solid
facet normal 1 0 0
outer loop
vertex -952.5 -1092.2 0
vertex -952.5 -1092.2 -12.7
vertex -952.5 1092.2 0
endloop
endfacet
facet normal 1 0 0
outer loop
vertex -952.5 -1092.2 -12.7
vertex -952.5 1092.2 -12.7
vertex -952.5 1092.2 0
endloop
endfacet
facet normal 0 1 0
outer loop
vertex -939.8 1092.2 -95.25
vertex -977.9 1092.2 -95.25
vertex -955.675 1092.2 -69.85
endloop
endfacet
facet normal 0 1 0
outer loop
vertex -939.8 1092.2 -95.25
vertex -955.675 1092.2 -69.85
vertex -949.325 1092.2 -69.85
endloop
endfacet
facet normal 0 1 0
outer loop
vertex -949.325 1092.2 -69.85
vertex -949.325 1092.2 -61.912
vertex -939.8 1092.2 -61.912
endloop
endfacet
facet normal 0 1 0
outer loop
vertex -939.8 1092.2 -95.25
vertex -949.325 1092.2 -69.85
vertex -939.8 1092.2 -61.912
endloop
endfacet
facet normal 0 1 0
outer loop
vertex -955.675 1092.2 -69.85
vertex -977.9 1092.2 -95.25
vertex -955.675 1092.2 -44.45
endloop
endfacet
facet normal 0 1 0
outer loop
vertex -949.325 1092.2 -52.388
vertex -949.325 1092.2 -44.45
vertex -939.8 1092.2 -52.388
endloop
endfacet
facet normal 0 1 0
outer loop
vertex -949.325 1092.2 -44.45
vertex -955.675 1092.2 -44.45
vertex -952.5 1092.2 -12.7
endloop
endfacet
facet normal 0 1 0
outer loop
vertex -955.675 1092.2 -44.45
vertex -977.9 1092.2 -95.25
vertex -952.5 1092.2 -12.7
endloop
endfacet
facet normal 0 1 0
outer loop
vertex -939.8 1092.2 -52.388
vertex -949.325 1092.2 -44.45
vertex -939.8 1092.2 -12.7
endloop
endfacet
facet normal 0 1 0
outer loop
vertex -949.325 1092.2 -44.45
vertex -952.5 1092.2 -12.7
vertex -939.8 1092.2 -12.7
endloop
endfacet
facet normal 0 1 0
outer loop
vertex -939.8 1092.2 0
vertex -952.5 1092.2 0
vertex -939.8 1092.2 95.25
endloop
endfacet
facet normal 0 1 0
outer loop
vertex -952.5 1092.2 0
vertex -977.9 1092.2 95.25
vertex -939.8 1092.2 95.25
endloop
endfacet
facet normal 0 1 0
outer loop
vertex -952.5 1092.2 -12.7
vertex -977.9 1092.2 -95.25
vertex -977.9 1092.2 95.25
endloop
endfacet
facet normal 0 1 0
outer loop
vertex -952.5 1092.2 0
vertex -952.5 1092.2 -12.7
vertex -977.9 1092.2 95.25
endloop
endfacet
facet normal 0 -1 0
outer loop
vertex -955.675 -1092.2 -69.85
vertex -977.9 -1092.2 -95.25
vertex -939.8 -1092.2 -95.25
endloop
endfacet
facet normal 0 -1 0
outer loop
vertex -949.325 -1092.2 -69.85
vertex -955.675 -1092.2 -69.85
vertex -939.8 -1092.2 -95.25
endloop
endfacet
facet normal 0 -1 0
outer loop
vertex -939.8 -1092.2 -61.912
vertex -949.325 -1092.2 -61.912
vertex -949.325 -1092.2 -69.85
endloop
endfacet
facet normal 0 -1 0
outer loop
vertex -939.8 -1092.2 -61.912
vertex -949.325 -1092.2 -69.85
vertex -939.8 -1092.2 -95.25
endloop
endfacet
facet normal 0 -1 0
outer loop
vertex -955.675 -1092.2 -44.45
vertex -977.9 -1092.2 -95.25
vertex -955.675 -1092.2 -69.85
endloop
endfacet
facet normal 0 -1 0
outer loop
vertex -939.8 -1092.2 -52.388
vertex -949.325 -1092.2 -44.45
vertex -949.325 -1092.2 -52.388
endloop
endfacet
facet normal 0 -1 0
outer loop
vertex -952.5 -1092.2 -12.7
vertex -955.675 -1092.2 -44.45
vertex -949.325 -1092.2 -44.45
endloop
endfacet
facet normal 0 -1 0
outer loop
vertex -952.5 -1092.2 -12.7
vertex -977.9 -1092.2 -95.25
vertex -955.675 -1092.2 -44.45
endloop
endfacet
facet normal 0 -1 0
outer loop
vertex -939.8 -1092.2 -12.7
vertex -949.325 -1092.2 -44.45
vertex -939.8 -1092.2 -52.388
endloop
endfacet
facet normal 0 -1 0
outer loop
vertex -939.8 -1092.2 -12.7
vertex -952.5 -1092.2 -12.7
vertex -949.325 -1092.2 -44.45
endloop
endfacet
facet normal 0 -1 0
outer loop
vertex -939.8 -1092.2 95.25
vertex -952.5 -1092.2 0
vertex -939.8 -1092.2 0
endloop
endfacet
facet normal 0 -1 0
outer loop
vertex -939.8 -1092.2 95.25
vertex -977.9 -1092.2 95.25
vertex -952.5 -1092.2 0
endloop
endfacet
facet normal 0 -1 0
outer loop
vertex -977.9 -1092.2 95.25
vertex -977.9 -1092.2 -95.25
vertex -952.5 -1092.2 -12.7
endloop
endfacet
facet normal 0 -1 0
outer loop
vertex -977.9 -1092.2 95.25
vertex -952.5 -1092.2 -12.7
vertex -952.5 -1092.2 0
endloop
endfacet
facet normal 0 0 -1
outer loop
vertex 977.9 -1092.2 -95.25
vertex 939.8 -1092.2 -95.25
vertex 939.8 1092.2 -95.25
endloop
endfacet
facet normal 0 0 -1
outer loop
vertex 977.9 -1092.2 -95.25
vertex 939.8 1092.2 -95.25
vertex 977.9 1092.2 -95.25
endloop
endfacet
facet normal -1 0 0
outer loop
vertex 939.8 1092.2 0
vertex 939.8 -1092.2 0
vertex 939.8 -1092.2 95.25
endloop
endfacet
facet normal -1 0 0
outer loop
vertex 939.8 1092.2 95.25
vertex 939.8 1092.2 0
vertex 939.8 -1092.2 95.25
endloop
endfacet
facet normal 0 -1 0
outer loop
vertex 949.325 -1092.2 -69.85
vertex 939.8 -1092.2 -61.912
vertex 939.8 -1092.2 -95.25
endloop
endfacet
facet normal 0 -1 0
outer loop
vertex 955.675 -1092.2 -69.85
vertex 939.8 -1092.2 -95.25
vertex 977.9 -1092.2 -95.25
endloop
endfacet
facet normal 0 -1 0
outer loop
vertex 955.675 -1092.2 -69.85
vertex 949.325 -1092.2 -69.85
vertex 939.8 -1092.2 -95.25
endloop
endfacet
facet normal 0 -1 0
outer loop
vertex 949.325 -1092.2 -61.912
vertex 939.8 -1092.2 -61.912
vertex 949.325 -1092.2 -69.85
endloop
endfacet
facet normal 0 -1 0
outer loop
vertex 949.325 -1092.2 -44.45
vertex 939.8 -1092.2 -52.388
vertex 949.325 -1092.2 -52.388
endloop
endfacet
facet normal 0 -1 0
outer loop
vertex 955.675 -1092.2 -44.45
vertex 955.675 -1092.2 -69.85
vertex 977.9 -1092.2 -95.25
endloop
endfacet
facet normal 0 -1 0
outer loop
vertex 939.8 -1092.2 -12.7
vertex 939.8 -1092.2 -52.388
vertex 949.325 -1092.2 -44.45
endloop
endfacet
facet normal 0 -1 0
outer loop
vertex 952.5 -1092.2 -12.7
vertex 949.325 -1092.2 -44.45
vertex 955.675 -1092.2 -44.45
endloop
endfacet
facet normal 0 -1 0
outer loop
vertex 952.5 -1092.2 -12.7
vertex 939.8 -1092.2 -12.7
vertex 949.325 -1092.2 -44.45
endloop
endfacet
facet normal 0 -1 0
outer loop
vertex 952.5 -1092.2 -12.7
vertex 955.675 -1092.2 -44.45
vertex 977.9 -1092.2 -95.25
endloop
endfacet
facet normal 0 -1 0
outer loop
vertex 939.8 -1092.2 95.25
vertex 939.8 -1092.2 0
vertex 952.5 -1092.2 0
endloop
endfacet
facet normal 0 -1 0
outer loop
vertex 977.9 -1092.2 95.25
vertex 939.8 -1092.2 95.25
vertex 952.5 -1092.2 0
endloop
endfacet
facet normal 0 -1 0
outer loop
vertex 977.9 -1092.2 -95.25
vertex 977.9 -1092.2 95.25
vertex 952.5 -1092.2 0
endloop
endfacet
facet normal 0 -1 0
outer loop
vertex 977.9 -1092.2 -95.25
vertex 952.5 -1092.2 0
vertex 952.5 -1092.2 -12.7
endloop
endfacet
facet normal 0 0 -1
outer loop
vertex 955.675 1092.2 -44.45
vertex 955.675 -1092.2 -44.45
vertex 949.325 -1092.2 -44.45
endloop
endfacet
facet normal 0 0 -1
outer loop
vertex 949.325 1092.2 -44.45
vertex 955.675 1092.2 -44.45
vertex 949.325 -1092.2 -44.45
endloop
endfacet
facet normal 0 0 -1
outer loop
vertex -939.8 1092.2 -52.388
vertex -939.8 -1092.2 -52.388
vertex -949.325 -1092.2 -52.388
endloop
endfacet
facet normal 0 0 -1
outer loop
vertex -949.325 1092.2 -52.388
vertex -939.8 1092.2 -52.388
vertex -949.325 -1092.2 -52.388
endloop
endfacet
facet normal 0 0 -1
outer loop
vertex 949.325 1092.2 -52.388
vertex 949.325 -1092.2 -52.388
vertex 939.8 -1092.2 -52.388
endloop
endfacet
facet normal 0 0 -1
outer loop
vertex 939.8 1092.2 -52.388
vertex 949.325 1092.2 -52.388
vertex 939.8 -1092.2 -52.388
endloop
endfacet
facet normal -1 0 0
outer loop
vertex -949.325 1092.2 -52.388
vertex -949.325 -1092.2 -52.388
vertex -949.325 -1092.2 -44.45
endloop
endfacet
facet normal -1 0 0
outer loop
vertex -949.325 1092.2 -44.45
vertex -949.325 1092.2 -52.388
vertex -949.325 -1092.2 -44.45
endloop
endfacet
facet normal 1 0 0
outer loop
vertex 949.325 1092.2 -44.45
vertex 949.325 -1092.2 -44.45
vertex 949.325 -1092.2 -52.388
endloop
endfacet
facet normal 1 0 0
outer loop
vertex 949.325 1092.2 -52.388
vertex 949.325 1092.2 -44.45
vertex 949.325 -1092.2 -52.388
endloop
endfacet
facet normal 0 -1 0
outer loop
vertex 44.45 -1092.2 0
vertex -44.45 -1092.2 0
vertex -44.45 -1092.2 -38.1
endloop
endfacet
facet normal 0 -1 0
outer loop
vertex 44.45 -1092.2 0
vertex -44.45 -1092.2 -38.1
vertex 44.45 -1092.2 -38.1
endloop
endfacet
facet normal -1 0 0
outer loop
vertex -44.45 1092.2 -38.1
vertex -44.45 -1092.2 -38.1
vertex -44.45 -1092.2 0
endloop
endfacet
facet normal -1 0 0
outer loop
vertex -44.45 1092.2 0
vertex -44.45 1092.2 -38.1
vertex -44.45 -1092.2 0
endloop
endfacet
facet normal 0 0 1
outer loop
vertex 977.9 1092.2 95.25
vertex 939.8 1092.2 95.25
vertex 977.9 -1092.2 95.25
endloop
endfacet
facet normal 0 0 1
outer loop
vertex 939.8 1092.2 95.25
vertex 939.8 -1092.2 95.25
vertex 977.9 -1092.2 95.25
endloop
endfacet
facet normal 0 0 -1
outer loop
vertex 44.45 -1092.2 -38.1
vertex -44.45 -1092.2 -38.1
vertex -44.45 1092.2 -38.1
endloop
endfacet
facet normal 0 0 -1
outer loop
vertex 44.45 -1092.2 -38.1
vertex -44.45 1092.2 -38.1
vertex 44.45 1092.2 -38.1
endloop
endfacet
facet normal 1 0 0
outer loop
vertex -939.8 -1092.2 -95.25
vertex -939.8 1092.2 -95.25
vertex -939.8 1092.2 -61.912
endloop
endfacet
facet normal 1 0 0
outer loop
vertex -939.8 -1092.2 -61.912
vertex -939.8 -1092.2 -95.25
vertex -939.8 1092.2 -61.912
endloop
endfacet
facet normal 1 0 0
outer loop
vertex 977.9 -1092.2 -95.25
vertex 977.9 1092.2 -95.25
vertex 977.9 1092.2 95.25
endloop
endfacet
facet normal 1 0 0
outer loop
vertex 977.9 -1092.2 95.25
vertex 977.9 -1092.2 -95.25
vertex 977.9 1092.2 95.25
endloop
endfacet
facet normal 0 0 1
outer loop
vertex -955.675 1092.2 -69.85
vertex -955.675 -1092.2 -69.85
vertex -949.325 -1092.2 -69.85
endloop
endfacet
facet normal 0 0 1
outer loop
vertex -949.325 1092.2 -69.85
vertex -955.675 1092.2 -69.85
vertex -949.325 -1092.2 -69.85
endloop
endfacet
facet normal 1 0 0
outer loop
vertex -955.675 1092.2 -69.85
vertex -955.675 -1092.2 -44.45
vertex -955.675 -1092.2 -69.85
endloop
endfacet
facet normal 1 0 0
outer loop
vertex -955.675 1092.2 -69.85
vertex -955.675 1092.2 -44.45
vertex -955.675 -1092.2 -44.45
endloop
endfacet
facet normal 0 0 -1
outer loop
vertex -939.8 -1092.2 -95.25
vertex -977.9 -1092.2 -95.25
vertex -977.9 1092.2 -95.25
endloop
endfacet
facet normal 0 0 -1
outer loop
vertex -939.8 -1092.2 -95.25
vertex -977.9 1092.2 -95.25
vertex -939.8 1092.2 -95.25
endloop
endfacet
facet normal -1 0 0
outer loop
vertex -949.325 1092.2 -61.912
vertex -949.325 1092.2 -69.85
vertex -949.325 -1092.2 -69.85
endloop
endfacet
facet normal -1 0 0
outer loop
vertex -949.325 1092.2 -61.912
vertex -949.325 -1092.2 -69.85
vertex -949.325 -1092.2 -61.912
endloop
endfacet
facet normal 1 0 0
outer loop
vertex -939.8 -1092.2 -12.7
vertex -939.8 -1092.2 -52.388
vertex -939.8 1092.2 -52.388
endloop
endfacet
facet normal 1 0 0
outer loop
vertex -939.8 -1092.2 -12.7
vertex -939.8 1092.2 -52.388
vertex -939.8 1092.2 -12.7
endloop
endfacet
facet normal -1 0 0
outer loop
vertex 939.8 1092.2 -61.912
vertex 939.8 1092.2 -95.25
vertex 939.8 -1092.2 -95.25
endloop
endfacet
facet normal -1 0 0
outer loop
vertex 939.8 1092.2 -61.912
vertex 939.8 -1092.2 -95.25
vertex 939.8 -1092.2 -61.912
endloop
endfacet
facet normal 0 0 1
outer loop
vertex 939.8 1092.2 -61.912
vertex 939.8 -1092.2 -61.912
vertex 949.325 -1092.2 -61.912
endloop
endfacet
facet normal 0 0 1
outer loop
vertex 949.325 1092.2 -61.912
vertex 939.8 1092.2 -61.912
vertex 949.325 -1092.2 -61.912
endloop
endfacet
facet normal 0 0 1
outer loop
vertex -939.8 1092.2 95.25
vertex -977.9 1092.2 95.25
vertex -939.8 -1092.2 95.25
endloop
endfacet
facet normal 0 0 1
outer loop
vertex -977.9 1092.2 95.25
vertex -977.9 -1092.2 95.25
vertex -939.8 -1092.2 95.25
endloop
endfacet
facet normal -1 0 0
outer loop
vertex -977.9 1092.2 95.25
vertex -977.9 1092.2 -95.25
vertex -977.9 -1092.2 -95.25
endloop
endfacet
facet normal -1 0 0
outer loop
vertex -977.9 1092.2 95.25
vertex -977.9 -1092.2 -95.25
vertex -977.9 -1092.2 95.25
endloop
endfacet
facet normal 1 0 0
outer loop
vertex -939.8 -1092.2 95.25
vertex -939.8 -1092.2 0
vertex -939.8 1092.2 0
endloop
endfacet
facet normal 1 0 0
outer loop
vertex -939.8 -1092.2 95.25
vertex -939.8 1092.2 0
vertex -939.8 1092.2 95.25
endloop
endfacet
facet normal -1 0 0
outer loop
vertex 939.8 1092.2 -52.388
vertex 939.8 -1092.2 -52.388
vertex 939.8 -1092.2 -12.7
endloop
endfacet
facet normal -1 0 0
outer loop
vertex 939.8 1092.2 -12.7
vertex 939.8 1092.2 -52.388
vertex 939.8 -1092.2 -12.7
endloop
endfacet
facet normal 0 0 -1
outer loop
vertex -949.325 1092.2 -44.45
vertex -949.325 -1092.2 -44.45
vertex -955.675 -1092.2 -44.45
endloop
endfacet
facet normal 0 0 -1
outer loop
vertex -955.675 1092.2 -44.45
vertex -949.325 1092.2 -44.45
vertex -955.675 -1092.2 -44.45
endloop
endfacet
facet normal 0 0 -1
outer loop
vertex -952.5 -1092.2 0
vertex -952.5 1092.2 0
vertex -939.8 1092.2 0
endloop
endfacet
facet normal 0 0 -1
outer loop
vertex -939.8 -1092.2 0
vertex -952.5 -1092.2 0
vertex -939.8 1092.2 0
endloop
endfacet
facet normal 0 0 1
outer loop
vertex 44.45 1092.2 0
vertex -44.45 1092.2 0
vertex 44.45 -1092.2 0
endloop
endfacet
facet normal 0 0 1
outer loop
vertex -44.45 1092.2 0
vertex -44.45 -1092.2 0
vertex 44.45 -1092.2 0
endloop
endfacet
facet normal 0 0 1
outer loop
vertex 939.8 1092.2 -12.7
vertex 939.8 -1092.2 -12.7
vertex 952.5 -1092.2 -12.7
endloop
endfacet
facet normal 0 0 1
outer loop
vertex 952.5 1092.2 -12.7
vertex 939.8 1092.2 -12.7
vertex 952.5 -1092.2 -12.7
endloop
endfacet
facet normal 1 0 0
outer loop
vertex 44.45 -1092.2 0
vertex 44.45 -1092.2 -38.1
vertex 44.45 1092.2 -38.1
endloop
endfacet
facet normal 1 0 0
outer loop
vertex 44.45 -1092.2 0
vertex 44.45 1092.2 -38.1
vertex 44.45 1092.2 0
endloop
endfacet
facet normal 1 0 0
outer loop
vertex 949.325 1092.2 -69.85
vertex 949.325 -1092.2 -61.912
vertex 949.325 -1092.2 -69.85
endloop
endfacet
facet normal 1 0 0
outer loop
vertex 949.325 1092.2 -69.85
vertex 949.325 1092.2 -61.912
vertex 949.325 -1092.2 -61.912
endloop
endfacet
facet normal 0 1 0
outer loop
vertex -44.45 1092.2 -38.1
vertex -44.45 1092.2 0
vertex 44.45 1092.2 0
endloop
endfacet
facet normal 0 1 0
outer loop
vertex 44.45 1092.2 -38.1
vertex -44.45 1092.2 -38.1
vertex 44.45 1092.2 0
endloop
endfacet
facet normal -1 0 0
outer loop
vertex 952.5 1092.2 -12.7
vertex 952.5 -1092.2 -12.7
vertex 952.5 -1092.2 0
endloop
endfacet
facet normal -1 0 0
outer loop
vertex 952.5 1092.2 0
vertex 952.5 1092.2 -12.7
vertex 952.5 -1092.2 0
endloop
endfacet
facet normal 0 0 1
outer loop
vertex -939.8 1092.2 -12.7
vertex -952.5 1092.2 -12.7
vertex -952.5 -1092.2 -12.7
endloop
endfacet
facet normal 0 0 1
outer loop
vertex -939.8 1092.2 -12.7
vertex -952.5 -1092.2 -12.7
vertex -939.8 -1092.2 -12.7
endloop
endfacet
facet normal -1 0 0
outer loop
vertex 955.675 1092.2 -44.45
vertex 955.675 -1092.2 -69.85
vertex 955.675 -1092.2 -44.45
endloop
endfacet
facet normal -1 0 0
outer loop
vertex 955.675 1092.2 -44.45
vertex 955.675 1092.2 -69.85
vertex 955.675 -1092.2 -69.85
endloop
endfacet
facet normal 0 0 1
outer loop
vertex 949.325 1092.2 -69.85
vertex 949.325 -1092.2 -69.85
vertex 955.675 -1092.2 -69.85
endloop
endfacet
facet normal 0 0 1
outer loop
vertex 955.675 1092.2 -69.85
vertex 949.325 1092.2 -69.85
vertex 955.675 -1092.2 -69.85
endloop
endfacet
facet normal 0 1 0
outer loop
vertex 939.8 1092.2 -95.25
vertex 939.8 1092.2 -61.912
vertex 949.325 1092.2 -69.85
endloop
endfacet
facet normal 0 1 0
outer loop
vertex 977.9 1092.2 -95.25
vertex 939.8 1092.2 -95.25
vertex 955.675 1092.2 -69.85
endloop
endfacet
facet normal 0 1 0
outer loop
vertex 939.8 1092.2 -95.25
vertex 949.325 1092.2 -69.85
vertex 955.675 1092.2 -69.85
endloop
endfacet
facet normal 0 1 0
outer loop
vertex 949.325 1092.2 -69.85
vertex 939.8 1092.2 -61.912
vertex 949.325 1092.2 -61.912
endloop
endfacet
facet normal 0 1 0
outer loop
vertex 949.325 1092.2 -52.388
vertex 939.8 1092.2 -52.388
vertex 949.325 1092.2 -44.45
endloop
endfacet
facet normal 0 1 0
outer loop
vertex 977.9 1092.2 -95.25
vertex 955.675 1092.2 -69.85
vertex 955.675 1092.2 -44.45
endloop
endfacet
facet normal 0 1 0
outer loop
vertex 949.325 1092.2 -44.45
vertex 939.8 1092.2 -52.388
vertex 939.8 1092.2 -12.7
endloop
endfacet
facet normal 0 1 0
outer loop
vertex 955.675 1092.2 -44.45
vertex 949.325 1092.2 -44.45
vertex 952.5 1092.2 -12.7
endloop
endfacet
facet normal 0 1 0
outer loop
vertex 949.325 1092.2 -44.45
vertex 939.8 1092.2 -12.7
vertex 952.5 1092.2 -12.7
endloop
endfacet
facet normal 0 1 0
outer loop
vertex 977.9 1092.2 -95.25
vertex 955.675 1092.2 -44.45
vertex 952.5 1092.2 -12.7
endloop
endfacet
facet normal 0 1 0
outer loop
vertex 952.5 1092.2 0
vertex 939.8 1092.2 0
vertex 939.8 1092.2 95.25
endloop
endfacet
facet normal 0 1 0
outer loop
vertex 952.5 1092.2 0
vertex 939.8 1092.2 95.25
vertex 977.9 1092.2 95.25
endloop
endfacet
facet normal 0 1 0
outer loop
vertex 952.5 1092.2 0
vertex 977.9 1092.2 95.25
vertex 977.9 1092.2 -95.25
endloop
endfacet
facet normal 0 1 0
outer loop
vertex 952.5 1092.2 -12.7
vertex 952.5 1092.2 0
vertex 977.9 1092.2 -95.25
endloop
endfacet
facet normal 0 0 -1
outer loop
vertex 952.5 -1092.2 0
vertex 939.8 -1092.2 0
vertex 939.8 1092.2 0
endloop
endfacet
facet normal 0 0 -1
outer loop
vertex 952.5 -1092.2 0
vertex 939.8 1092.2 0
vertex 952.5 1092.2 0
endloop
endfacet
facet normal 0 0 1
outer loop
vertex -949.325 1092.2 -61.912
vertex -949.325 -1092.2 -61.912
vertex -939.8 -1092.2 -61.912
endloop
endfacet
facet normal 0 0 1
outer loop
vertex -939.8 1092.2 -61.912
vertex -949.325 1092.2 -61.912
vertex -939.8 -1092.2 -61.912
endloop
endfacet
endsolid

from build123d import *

# Parameters (mm, degrees)
F0_W     = 38.1
F0_H     = 190.5
F1_DEPTH = 1092.2
F0_W_2   = 88.9
F0_H_2   = 38.1
F2_W     = 12.7
F2_H     = 12.7
F3_DEPTH = 1092.2


# Not quite as in the source:
# - a feature names something its author has since deleted; it is built from what else it names


with BuildPart() as f1:
    # F0 (on Front) → F1 (new body, symmetric)
    with BuildSketch(Plane.XZ):
        with Locations((-958.85, 0)):
            Rectangle(F0_W, F0_H)
    extrude(amount=F1_DEPTH, both=True)


with BuildPart() as f1b:
    # F0 (on Front) → F1, piece 2 (new body, symmetric)
    with BuildSketch(Plane.XZ):
        with Locations((958.85, 0)):
            Rectangle(F0_W, F0_H)
    extrude(amount=F1_DEPTH, both=True)


with BuildPart() as f1c:
    # F0 (on Front) → F1, piece 3 (new body, symmetric)
    with BuildSketch(Plane.XZ):
        with Locations((0, -19.05)):
            Rectangle(F0_W_2, F0_H_2)
    extrude(amount=F1_DEPTH, both=True)


with BuildPart() as f3_tool:
    # F2 (on Front) → F3 (new body, symmetric)
    with BuildSketch(Plane.XZ):
        Polygon((-949.325, -61.9125), (-939.8, -61.9125), (-939.8, -57.15), (-955.675, -57.15), (-955.675, -69.85), (-949.325, -69.85), align=None)
        Polygon((-955.675, -57.15), (-939.8, -57.15), (-939.8, -52.3875), (-949.325, -52.3875), (-949.325, -44.45), (-955.675, -44.45), align=None)
        Polygon((949.325, -52.3875), (939.8, -52.3875), (939.8, -57.15), (955.675, -57.15), (955.675, -44.45), (949.325, -44.45), align=None)
        Polygon((955.675, -57.15), (939.8, -57.15), (939.8, -61.9125), (949.325, -61.9125), (949.325, -69.85), (955.675, -69.85), align=None)
        with Locations((-946.1499856949, -6.35)):
            Rectangle(F2_W, F2_H)
        with Locations((946.1499856949, -6.35)):
            Rectangle(F2_W, F2_H)
    extrude(amount=F3_DEPTH, both=True)


with BuildPart() as f1_1:
    add(f1.part)

    # F3: cut by f3_tool
    add(f3_tool.part, mode=Mode.SUBTRACT)


with BuildPart() as f1b_1:
    add(f1b.part)

    # F3: cut by f3_tool
    add(f3_tool.part, mode=Mode.SUBTRACT)


solid = Compound([f1c.part, f1_1.part, f1b_1.part])
